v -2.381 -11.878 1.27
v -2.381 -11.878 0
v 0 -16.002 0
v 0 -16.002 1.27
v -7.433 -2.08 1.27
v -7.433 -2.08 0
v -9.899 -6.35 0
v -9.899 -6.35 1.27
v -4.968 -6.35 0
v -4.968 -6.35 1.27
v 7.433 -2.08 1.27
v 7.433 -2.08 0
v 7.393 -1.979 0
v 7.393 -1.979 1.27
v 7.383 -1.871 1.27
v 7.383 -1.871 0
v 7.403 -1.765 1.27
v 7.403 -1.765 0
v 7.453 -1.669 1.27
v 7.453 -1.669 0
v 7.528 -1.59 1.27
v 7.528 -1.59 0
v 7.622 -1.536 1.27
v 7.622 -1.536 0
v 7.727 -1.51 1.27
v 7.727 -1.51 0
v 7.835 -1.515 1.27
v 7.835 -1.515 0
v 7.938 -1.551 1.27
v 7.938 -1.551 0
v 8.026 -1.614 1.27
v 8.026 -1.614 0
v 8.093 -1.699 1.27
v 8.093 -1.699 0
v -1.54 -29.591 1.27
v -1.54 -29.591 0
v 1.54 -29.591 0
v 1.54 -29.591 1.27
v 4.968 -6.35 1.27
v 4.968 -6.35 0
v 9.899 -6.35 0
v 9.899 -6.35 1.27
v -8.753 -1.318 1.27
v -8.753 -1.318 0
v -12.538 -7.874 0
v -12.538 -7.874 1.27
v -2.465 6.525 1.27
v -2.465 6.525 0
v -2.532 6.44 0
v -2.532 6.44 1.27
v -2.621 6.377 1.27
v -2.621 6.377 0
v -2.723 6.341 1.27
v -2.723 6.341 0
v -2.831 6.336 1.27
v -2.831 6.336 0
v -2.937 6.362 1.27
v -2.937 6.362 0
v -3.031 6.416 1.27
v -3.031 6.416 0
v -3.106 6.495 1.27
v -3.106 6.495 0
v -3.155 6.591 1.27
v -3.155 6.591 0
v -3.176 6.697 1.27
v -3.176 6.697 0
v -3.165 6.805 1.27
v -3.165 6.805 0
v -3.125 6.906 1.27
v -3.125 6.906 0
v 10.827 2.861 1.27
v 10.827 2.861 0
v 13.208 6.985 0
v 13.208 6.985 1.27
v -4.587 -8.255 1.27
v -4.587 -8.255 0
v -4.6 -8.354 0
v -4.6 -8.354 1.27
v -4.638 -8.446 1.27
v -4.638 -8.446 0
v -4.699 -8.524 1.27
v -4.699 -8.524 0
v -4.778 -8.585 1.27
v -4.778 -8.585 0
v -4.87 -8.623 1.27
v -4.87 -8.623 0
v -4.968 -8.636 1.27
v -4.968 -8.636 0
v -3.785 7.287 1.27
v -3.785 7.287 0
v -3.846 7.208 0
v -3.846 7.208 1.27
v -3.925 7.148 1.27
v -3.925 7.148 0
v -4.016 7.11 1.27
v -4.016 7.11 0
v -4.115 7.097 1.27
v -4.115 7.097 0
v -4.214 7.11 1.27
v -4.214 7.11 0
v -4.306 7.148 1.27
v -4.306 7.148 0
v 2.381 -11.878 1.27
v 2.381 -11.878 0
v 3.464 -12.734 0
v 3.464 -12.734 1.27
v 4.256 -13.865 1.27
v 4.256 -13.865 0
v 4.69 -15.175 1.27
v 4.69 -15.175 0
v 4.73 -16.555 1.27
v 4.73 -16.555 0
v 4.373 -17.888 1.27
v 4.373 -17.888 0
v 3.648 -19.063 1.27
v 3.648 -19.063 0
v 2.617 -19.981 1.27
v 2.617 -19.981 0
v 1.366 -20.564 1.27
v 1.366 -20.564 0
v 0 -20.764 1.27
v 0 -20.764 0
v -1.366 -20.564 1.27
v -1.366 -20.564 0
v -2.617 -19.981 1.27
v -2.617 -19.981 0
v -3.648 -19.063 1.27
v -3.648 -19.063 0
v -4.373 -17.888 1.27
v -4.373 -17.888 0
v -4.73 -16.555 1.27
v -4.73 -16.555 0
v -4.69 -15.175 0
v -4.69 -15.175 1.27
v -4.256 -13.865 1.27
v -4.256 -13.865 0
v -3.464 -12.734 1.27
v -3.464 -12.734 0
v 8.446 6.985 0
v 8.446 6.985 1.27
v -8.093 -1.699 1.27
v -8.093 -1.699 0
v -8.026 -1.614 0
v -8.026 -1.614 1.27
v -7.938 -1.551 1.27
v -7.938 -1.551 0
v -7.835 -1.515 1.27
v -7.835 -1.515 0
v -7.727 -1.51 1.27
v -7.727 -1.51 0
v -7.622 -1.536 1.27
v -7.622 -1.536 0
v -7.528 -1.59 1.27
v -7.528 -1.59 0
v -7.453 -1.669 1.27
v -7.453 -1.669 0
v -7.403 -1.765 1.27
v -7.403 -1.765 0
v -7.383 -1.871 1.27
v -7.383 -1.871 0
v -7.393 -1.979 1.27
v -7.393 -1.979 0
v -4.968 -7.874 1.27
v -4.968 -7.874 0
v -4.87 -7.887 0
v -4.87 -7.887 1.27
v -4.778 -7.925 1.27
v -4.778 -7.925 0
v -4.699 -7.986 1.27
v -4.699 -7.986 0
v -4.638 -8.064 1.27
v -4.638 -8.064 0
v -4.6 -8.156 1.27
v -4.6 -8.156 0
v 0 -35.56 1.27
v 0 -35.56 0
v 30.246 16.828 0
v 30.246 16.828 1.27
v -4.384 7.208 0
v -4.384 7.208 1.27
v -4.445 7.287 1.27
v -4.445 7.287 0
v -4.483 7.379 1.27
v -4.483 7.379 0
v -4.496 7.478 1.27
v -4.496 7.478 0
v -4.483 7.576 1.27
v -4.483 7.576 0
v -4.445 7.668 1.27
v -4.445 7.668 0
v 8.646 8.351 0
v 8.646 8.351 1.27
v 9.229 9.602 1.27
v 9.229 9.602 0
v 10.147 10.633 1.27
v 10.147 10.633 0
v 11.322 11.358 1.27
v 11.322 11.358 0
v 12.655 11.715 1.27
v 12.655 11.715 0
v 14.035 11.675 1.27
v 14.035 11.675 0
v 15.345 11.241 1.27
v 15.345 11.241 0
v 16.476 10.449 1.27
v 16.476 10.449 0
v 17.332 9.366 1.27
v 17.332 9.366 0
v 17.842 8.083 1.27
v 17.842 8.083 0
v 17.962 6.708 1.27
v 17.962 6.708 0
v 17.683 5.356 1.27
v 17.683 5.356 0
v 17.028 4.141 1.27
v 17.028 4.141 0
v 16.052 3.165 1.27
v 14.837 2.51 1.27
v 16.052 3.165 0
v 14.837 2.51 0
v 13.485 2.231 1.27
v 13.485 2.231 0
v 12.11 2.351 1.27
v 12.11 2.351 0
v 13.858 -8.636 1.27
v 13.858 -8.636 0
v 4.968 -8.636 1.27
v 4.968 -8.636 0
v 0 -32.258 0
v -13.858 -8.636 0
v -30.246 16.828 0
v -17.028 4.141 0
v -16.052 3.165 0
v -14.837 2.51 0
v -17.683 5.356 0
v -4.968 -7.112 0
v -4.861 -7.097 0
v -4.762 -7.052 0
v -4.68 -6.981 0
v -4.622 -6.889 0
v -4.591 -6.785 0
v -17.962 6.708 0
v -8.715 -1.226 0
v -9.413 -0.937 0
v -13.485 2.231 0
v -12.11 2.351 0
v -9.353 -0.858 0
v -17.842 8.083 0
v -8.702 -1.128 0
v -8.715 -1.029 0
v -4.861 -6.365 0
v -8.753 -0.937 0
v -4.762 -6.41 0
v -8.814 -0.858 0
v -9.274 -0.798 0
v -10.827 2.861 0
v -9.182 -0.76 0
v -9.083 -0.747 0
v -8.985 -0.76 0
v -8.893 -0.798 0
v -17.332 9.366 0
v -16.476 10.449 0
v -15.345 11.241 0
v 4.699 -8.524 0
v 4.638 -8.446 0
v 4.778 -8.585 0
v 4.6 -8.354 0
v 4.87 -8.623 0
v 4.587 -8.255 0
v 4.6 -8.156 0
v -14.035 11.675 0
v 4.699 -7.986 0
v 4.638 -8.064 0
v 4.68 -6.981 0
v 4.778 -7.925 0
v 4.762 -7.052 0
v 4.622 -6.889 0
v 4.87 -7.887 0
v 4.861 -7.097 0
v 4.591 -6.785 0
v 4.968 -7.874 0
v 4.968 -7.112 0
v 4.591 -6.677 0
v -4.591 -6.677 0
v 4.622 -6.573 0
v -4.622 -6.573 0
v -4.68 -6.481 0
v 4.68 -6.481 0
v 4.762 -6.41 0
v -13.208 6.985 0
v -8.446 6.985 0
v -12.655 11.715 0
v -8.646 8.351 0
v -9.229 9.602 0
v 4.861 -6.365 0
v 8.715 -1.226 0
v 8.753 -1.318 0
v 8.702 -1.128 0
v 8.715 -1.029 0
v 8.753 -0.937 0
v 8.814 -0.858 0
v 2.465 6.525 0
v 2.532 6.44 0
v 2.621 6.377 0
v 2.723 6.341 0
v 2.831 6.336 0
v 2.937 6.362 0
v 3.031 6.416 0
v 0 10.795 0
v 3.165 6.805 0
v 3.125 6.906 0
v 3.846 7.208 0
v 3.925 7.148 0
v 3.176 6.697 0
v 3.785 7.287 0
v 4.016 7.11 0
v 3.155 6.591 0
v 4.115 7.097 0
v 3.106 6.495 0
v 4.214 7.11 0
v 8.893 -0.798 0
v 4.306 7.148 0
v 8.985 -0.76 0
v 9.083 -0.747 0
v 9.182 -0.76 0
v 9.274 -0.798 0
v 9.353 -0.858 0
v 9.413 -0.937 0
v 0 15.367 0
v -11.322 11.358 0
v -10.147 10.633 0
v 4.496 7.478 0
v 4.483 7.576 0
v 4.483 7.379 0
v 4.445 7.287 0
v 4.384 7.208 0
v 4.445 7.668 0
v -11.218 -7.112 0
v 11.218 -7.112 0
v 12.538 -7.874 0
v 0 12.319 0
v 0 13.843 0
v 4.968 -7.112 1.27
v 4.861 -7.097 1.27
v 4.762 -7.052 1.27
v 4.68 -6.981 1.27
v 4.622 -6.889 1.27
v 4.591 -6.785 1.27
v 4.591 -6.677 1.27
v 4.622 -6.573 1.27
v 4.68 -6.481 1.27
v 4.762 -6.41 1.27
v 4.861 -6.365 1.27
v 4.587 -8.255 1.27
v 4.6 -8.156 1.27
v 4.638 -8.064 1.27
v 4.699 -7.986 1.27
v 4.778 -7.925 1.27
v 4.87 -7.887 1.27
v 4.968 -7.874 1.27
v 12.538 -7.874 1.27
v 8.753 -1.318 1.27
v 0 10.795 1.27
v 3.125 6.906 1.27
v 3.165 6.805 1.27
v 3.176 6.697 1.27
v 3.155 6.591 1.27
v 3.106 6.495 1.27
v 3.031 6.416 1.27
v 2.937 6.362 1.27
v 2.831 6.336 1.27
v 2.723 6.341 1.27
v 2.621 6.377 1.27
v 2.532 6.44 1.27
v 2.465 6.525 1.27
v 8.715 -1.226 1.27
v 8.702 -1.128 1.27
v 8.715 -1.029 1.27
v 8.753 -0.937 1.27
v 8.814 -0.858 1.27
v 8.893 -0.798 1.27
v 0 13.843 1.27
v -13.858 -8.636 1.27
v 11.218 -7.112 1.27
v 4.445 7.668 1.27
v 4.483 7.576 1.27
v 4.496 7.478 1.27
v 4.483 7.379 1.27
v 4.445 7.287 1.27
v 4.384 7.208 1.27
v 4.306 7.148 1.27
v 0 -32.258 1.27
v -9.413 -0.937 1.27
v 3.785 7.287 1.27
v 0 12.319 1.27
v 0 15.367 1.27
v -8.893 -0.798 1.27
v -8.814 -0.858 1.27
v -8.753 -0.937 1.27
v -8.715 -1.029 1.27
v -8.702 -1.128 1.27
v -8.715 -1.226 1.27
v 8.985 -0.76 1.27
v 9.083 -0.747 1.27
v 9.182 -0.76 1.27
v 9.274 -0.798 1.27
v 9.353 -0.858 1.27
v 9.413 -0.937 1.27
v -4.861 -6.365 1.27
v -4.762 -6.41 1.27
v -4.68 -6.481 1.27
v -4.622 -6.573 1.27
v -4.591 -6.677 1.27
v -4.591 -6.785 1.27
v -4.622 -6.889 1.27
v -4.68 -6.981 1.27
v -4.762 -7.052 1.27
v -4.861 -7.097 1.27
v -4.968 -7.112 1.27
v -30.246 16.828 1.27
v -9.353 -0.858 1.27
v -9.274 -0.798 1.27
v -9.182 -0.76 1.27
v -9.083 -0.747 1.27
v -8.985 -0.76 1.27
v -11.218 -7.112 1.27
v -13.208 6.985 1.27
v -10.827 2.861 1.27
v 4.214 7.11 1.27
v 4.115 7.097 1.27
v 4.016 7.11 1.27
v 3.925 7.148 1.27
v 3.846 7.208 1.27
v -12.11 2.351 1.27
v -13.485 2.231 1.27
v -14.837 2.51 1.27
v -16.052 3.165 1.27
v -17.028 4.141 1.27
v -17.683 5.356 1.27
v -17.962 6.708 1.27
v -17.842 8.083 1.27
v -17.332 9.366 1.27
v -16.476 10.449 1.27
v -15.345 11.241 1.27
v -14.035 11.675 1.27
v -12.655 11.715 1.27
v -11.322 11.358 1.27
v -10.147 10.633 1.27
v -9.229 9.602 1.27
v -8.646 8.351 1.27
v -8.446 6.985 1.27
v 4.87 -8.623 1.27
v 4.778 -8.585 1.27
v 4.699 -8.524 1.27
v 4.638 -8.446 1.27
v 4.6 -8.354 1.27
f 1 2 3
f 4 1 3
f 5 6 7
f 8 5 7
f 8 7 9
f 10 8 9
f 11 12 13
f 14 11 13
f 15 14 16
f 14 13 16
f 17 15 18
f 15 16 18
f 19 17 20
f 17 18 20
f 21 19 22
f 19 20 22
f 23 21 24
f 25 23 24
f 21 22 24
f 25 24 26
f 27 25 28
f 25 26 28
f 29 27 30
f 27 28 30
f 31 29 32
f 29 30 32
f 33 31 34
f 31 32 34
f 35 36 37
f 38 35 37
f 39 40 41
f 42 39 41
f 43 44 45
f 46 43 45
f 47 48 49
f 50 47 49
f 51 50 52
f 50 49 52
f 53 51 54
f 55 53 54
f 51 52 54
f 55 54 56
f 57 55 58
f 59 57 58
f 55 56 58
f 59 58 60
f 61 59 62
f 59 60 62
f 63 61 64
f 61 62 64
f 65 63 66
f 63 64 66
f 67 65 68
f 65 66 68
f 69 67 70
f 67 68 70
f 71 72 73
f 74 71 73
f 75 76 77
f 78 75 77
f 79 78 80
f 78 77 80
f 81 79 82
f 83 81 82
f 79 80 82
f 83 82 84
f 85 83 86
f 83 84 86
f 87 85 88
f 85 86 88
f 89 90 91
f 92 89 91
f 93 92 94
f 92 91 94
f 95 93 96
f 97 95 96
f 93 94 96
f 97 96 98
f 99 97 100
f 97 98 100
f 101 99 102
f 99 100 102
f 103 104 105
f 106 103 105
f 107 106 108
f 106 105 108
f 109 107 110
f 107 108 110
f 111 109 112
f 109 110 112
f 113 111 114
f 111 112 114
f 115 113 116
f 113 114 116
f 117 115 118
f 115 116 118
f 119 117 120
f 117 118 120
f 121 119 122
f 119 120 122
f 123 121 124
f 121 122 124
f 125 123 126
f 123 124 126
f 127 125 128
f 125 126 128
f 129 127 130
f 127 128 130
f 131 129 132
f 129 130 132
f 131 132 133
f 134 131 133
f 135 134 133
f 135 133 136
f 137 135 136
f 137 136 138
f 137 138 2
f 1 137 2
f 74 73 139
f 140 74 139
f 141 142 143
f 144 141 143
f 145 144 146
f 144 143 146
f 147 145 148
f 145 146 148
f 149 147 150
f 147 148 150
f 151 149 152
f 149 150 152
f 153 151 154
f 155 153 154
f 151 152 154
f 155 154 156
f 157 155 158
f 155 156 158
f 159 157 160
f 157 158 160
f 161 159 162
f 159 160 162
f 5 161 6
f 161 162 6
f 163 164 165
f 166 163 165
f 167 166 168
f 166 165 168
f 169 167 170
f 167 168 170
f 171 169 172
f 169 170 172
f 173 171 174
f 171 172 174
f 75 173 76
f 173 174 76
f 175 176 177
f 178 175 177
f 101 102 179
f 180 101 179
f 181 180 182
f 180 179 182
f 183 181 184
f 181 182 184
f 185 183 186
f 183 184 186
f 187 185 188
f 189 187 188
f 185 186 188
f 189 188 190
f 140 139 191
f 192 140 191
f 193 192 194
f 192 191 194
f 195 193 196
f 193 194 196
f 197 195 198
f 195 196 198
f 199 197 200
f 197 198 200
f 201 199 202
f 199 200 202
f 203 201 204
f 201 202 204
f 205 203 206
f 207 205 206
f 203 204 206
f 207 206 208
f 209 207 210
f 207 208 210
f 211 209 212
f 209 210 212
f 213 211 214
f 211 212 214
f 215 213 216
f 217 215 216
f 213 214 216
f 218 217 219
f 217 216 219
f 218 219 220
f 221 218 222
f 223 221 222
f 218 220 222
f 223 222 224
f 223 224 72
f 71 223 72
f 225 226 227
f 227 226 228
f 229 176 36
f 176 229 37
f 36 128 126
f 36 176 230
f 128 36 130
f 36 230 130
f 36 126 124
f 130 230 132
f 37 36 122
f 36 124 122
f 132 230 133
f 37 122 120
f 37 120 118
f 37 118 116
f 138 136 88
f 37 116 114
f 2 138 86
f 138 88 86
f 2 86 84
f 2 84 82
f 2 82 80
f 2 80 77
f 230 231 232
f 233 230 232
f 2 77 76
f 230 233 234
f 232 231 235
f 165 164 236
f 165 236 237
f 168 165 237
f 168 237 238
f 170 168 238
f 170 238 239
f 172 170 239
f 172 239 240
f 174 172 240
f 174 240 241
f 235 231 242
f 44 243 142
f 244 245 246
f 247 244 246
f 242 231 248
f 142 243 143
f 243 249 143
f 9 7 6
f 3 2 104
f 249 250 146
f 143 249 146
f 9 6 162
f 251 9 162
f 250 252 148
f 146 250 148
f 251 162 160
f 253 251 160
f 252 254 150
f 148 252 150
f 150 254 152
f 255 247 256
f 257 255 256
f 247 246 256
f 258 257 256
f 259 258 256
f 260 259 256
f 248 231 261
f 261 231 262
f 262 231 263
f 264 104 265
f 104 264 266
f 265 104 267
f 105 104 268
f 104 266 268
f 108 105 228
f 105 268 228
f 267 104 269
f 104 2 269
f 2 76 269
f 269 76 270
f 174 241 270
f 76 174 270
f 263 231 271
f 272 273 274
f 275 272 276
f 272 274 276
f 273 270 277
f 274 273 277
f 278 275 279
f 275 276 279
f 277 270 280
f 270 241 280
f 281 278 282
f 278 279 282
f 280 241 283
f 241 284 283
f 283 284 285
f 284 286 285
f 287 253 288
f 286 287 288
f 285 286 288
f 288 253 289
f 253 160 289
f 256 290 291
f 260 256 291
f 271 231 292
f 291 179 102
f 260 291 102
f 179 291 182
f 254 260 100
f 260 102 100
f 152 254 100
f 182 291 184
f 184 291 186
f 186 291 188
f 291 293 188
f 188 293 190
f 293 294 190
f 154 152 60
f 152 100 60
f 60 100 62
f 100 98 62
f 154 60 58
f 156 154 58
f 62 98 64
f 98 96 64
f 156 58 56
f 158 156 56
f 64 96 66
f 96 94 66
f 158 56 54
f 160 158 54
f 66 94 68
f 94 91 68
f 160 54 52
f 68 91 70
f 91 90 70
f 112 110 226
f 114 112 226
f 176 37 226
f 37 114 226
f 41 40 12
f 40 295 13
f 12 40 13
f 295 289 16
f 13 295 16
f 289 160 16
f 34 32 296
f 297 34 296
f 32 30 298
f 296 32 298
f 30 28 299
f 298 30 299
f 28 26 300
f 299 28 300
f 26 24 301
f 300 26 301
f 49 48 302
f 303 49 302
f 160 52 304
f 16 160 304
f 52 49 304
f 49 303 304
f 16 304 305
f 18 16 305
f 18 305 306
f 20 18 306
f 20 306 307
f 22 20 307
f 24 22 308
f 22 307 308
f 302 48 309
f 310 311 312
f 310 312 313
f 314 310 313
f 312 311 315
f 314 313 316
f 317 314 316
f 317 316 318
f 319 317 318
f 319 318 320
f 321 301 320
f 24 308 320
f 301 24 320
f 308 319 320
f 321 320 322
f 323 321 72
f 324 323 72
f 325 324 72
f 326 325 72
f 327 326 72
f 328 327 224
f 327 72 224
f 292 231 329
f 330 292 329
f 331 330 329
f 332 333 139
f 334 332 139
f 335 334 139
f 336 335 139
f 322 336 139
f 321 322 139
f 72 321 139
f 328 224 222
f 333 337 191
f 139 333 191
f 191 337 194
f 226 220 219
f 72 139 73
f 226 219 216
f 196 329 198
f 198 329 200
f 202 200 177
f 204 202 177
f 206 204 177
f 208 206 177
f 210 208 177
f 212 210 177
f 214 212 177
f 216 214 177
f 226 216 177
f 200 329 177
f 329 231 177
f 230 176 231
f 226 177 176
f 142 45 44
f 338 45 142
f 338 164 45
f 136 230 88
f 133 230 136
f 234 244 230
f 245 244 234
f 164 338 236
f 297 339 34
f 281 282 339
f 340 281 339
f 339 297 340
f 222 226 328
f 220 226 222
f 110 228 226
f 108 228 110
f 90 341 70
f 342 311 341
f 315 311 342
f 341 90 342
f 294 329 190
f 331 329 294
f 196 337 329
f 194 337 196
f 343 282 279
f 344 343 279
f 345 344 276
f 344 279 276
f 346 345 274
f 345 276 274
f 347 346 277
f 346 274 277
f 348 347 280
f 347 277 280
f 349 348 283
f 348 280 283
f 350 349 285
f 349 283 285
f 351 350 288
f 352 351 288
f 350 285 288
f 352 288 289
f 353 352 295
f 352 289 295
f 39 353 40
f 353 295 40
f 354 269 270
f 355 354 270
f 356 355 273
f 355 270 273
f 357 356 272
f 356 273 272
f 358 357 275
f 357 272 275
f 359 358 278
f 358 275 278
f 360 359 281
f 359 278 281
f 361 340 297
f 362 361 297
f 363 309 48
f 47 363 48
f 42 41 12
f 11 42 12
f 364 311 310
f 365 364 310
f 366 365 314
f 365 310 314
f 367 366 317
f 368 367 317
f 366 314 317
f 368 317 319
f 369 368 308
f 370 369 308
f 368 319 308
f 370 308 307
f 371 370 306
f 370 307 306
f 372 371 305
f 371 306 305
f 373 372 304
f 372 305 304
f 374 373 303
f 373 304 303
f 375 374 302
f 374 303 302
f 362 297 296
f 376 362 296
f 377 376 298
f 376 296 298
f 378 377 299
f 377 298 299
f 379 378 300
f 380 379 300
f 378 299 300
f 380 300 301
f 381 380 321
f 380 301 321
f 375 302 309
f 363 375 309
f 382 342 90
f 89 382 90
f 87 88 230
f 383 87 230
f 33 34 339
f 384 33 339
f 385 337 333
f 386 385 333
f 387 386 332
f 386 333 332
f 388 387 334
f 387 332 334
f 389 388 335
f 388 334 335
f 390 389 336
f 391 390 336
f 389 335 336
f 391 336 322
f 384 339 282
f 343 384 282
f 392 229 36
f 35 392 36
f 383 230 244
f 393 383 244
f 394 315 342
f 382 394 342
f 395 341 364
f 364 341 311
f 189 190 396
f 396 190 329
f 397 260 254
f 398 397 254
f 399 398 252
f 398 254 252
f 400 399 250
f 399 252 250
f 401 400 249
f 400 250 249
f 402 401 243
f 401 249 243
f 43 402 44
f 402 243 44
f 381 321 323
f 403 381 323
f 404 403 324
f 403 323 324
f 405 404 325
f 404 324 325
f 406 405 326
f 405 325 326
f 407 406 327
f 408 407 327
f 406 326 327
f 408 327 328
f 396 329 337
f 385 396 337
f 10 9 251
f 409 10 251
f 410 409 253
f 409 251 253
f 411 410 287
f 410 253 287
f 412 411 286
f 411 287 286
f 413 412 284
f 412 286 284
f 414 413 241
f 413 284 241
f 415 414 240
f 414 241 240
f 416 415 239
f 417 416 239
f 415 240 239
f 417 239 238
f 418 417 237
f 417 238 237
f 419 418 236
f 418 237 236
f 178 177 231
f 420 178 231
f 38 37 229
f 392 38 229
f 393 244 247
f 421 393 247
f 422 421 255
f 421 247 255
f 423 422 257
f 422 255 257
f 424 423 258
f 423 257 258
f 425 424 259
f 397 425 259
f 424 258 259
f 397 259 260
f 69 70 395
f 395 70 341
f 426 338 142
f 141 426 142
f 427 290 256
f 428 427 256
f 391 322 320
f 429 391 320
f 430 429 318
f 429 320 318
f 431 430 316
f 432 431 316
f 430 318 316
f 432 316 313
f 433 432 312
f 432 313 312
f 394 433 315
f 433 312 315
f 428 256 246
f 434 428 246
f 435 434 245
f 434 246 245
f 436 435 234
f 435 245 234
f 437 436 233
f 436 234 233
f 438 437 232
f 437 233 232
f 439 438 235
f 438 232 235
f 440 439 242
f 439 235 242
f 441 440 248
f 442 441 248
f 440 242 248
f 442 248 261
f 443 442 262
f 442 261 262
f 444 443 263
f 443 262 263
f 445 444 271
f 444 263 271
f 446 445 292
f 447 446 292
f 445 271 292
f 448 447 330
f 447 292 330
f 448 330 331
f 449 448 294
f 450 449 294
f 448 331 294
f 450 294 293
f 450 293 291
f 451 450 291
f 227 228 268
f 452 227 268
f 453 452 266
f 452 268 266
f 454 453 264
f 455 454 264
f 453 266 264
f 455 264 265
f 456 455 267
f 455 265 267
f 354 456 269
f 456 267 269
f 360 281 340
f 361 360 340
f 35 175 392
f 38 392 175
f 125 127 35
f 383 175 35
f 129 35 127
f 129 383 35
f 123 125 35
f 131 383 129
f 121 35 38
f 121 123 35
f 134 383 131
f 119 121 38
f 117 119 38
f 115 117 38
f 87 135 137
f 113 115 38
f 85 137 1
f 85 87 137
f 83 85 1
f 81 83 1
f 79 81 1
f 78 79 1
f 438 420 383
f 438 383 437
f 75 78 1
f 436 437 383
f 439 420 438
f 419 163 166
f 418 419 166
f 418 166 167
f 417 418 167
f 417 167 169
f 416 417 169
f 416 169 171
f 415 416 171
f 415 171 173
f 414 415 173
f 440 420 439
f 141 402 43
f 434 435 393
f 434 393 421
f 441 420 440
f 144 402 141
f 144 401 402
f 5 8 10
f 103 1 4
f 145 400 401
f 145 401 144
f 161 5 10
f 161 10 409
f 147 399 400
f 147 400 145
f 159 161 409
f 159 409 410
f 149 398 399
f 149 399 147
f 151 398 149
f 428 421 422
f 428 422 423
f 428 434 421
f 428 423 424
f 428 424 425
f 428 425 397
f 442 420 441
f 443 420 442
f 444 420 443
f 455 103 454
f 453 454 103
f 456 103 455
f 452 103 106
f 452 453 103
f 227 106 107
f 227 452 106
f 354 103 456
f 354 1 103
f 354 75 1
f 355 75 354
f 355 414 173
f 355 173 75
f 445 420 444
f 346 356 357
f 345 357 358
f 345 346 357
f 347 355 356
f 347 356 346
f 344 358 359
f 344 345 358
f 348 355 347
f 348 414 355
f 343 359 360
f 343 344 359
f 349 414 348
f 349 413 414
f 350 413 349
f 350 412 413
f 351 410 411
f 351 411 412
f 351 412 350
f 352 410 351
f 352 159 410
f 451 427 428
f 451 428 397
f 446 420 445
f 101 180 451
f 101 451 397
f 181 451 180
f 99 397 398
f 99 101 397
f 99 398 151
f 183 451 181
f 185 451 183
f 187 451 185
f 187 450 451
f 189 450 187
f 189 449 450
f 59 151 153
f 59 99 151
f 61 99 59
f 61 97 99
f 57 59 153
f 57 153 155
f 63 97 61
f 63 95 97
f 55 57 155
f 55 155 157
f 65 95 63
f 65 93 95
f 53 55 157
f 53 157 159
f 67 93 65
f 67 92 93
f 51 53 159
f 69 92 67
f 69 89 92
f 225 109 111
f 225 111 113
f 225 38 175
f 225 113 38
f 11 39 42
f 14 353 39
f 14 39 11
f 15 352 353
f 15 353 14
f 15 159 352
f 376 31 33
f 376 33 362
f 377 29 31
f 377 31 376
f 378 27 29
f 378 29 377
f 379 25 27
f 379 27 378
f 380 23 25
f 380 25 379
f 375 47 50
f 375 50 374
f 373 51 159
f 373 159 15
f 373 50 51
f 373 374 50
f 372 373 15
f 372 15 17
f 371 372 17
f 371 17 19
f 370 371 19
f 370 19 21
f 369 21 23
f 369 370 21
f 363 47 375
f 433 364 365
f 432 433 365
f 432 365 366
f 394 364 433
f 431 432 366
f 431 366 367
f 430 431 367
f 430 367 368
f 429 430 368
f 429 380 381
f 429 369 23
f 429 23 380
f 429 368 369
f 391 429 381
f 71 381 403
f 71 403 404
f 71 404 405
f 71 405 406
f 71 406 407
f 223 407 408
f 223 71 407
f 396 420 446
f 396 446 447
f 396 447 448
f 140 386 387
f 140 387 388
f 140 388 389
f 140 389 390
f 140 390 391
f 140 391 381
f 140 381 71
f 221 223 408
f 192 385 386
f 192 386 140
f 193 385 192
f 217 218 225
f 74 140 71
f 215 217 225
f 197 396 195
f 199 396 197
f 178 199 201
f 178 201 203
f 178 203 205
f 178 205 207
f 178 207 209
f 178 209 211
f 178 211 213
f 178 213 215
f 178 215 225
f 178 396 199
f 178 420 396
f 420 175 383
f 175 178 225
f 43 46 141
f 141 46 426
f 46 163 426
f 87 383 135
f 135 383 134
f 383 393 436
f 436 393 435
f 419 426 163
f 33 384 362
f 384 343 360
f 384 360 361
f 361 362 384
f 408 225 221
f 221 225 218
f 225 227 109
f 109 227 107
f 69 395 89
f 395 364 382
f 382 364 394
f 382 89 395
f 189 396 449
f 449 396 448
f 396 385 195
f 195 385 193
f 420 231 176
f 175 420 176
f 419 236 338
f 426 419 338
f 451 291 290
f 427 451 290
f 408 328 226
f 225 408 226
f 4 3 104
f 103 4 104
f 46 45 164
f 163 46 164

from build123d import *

# Parameters (mm, degrees)
F1_DEPTH = 1.27


# Not quite as in the source:
# - a feature of the source that left no trace in its solid (it failed there, or was rolled back) is left out


with BuildPart() as f1:
    # F0 (on Top) → F1 (new body)
    with BuildSketch(Plane.XY):
        Polygon((30.2459372272, 16.8275), (-30.2459372272, 16.8275), (0, -35.56), align=None)
        Polygon((-1.5397931679, -29.591), (1.5397931679, -29.591), (0, -32.258), align=None, mode=Mode.SUBTRACT)
        with BuildLine():
            ThreePointArc((2.38125, -11.8775540145), (0, -20.7645), (-2.38125, -11.8775540145))
            Line((-2.38125, -11.8775540145), (0, -16.002))
            Line((0, -16.002), (2.38125, -11.8775540145))
        make_face(mode=Mode.SUBTRACT)
        with BuildLine():
            Line((-8.7532271537, -1.3180341604), (-12.538315796, -7.874))
            Line((-12.538315796, -7.874), (-4.9681385114, -7.874))
            ThreePointArc((-4.9681385114, -7.874), (-4.6987308277, -7.9855923164), (-4.5871385114, -8.255))
            ThreePointArc((-4.5871385114, -8.255), (-4.6987308277, -8.5244076836), (-4.9681385114, -8.636))
            Line((-4.9681385114, -8.636), (-13.8581385114, -8.636))
            Line((-13.8581385114, -8.636), (-9.4131385114, -0.9370341604))
            ThreePointArc((-9.4131385114, -0.9370341604), (-9.1817928887, -0.7595164205), (-8.8926828325, -0.7975784815))
            ThreePointArc((-8.8926828325, -0.7975784815), (-8.7151650927, -1.0289241042), (-8.7532271537, -1.3180341604))
        make_face(mode=Mode.SUBTRACT)
        with BuildLine():
            Line((-4.9681385114, -7.112), (-11.2184930806, -7.112))
            Line((-11.2184930806, -7.112), (-8.093315796, -1.6990341604))
            ThreePointArc((-8.093315796, -1.6990341604), (-7.5728601171, -1.5595784815), (-7.4334044383, -2.0800341604))
            Line((-7.4334044383, -2.0800341604), (-9.8986703653, -6.35))
            Line((-9.8986703653, -6.35), (-4.9681385114, -6.35))
            ThreePointArc((-4.9681385114, -6.35), (-4.5871385114, -6.731), (-4.9681385114, -7.112))
        make_face(mode=Mode.SUBTRACT)
        with BuildLine():
            ThreePointArc((-10.82675, 2.8605540145), (-17.3324459855, 9.36625), (-8.4455, 6.985))
            Line((-8.4455, 6.985), (-13.208, 6.985))
            Line((-13.208, 6.985), (-10.82675, 2.8605540145))
        make_face(mode=Mode.SUBTRACT)
        with BuildLine():
            Line((4.9681385114, -7.874), (12.538315796, -7.874))
            Line((12.538315796, -7.874), (8.7532271537, -1.3180341604))
            ThreePointArc((8.7532271537, -1.3180341604), (8.7151650927, -1.0289241042), (8.8926828325, -0.7975784815))
            ThreePointArc((8.8926828325, -0.7975784815), (9.1817928887, -0.7595164205), (9.4131385114, -0.9370341604))
            Line((9.4131385114, -0.9370341604), (13.8581385114, -8.636))
            Line((13.8581385114, -8.636), (4.9681385114, -8.636))
            ThreePointArc((4.9681385114, -8.636), (4.6987308277, -8.5244076836), (4.5871385114, -8.255))
            ThreePointArc((4.5871385114, -8.255), (4.6987308277, -7.9855923164), (4.9681385114, -7.874))
        make_face(mode=Mode.SUBTRACT)
        with BuildLine():
            Line((4.9681385114, -6.35), (9.8986703653, -6.35))
            Line((9.8986703653, -6.35), (7.4334044383, -2.0800341604))
            ThreePointArc((7.4334044383, -2.0800341604), (7.5728601171, -1.5595784815), (8.093315796, -1.6990341604))
            Line((8.093315796, -1.6990341604), (11.2184930806, -7.112))
            Line((11.2184930806, -7.112), (4.9681385114, -7.112))
            ThreePointArc((4.9681385114, -7.112), (4.5871385114, -6.731), (4.9681385114, -6.35))
        make_face(mode=Mode.SUBTRACT)
        with BuildLine():
            Line((-3.1251772846, 6.9060341604), (0, 12.319))
            Line((0, 12.319), (3.1251772846, 6.9060341604))
            ThreePointArc((3.1251772846, 6.9060341604), (2.9857216058, 6.3855784815), (2.4652659269, 6.5250341604))
            Line((2.4652659269, 6.5250341604), (0, 10.795))
            Line((0, 10.795), (-2.4652659269, 6.5250341604))
            ThreePointArc((-2.4652659269, 6.5250341604), (-2.9857216058, 6.3855784815), (-3.1251772846, 6.9060341604))
        make_face(mode=Mode.SUBTRACT)
        with BuildLine():
            ThreePointArc((8.4455, 6.985), (17.3324459855, 9.36625), (10.82675, 2.8605540145))
            Line((10.82675, 2.8605540145), (13.208, 6.985))
            Line((13.208, 6.985), (8.4455, 6.985))
        make_face(mode=Mode.SUBTRACT)
        with BuildLine():
            Line((3.7850886423, 7.2870341604), (0, 13.843))
            Line((0, 13.843), (-3.7850886423, 7.2870341604))
            ThreePointArc((-3.7850886423, 7.2870341604), (-4.016434265, 7.1095164205), (-4.3055443212, 7.1475784815))
            ThreePointArc((-4.3055443212, 7.1475784815), (-4.483062061, 7.3789241042), (-4.445, 7.6680341604))
            Line((-4.445, 7.6680341604), (0, 15.367))
            Line((0, 15.367), (4.445, 7.6680341604))
            ThreePointArc((4.445, 7.6680341604), (4.483062061, 7.3789241042), (4.3055443212, 7.1475784815))
            ThreePointArc((4.3055443212, 7.1475784815), (4.016434265, 7.1095164205), (3.7850886423, 7.2870341604))
        make_face(mode=Mode.SUBTRACT)
    extrude(amount=F1_DEPTH)


solid = f1.part
